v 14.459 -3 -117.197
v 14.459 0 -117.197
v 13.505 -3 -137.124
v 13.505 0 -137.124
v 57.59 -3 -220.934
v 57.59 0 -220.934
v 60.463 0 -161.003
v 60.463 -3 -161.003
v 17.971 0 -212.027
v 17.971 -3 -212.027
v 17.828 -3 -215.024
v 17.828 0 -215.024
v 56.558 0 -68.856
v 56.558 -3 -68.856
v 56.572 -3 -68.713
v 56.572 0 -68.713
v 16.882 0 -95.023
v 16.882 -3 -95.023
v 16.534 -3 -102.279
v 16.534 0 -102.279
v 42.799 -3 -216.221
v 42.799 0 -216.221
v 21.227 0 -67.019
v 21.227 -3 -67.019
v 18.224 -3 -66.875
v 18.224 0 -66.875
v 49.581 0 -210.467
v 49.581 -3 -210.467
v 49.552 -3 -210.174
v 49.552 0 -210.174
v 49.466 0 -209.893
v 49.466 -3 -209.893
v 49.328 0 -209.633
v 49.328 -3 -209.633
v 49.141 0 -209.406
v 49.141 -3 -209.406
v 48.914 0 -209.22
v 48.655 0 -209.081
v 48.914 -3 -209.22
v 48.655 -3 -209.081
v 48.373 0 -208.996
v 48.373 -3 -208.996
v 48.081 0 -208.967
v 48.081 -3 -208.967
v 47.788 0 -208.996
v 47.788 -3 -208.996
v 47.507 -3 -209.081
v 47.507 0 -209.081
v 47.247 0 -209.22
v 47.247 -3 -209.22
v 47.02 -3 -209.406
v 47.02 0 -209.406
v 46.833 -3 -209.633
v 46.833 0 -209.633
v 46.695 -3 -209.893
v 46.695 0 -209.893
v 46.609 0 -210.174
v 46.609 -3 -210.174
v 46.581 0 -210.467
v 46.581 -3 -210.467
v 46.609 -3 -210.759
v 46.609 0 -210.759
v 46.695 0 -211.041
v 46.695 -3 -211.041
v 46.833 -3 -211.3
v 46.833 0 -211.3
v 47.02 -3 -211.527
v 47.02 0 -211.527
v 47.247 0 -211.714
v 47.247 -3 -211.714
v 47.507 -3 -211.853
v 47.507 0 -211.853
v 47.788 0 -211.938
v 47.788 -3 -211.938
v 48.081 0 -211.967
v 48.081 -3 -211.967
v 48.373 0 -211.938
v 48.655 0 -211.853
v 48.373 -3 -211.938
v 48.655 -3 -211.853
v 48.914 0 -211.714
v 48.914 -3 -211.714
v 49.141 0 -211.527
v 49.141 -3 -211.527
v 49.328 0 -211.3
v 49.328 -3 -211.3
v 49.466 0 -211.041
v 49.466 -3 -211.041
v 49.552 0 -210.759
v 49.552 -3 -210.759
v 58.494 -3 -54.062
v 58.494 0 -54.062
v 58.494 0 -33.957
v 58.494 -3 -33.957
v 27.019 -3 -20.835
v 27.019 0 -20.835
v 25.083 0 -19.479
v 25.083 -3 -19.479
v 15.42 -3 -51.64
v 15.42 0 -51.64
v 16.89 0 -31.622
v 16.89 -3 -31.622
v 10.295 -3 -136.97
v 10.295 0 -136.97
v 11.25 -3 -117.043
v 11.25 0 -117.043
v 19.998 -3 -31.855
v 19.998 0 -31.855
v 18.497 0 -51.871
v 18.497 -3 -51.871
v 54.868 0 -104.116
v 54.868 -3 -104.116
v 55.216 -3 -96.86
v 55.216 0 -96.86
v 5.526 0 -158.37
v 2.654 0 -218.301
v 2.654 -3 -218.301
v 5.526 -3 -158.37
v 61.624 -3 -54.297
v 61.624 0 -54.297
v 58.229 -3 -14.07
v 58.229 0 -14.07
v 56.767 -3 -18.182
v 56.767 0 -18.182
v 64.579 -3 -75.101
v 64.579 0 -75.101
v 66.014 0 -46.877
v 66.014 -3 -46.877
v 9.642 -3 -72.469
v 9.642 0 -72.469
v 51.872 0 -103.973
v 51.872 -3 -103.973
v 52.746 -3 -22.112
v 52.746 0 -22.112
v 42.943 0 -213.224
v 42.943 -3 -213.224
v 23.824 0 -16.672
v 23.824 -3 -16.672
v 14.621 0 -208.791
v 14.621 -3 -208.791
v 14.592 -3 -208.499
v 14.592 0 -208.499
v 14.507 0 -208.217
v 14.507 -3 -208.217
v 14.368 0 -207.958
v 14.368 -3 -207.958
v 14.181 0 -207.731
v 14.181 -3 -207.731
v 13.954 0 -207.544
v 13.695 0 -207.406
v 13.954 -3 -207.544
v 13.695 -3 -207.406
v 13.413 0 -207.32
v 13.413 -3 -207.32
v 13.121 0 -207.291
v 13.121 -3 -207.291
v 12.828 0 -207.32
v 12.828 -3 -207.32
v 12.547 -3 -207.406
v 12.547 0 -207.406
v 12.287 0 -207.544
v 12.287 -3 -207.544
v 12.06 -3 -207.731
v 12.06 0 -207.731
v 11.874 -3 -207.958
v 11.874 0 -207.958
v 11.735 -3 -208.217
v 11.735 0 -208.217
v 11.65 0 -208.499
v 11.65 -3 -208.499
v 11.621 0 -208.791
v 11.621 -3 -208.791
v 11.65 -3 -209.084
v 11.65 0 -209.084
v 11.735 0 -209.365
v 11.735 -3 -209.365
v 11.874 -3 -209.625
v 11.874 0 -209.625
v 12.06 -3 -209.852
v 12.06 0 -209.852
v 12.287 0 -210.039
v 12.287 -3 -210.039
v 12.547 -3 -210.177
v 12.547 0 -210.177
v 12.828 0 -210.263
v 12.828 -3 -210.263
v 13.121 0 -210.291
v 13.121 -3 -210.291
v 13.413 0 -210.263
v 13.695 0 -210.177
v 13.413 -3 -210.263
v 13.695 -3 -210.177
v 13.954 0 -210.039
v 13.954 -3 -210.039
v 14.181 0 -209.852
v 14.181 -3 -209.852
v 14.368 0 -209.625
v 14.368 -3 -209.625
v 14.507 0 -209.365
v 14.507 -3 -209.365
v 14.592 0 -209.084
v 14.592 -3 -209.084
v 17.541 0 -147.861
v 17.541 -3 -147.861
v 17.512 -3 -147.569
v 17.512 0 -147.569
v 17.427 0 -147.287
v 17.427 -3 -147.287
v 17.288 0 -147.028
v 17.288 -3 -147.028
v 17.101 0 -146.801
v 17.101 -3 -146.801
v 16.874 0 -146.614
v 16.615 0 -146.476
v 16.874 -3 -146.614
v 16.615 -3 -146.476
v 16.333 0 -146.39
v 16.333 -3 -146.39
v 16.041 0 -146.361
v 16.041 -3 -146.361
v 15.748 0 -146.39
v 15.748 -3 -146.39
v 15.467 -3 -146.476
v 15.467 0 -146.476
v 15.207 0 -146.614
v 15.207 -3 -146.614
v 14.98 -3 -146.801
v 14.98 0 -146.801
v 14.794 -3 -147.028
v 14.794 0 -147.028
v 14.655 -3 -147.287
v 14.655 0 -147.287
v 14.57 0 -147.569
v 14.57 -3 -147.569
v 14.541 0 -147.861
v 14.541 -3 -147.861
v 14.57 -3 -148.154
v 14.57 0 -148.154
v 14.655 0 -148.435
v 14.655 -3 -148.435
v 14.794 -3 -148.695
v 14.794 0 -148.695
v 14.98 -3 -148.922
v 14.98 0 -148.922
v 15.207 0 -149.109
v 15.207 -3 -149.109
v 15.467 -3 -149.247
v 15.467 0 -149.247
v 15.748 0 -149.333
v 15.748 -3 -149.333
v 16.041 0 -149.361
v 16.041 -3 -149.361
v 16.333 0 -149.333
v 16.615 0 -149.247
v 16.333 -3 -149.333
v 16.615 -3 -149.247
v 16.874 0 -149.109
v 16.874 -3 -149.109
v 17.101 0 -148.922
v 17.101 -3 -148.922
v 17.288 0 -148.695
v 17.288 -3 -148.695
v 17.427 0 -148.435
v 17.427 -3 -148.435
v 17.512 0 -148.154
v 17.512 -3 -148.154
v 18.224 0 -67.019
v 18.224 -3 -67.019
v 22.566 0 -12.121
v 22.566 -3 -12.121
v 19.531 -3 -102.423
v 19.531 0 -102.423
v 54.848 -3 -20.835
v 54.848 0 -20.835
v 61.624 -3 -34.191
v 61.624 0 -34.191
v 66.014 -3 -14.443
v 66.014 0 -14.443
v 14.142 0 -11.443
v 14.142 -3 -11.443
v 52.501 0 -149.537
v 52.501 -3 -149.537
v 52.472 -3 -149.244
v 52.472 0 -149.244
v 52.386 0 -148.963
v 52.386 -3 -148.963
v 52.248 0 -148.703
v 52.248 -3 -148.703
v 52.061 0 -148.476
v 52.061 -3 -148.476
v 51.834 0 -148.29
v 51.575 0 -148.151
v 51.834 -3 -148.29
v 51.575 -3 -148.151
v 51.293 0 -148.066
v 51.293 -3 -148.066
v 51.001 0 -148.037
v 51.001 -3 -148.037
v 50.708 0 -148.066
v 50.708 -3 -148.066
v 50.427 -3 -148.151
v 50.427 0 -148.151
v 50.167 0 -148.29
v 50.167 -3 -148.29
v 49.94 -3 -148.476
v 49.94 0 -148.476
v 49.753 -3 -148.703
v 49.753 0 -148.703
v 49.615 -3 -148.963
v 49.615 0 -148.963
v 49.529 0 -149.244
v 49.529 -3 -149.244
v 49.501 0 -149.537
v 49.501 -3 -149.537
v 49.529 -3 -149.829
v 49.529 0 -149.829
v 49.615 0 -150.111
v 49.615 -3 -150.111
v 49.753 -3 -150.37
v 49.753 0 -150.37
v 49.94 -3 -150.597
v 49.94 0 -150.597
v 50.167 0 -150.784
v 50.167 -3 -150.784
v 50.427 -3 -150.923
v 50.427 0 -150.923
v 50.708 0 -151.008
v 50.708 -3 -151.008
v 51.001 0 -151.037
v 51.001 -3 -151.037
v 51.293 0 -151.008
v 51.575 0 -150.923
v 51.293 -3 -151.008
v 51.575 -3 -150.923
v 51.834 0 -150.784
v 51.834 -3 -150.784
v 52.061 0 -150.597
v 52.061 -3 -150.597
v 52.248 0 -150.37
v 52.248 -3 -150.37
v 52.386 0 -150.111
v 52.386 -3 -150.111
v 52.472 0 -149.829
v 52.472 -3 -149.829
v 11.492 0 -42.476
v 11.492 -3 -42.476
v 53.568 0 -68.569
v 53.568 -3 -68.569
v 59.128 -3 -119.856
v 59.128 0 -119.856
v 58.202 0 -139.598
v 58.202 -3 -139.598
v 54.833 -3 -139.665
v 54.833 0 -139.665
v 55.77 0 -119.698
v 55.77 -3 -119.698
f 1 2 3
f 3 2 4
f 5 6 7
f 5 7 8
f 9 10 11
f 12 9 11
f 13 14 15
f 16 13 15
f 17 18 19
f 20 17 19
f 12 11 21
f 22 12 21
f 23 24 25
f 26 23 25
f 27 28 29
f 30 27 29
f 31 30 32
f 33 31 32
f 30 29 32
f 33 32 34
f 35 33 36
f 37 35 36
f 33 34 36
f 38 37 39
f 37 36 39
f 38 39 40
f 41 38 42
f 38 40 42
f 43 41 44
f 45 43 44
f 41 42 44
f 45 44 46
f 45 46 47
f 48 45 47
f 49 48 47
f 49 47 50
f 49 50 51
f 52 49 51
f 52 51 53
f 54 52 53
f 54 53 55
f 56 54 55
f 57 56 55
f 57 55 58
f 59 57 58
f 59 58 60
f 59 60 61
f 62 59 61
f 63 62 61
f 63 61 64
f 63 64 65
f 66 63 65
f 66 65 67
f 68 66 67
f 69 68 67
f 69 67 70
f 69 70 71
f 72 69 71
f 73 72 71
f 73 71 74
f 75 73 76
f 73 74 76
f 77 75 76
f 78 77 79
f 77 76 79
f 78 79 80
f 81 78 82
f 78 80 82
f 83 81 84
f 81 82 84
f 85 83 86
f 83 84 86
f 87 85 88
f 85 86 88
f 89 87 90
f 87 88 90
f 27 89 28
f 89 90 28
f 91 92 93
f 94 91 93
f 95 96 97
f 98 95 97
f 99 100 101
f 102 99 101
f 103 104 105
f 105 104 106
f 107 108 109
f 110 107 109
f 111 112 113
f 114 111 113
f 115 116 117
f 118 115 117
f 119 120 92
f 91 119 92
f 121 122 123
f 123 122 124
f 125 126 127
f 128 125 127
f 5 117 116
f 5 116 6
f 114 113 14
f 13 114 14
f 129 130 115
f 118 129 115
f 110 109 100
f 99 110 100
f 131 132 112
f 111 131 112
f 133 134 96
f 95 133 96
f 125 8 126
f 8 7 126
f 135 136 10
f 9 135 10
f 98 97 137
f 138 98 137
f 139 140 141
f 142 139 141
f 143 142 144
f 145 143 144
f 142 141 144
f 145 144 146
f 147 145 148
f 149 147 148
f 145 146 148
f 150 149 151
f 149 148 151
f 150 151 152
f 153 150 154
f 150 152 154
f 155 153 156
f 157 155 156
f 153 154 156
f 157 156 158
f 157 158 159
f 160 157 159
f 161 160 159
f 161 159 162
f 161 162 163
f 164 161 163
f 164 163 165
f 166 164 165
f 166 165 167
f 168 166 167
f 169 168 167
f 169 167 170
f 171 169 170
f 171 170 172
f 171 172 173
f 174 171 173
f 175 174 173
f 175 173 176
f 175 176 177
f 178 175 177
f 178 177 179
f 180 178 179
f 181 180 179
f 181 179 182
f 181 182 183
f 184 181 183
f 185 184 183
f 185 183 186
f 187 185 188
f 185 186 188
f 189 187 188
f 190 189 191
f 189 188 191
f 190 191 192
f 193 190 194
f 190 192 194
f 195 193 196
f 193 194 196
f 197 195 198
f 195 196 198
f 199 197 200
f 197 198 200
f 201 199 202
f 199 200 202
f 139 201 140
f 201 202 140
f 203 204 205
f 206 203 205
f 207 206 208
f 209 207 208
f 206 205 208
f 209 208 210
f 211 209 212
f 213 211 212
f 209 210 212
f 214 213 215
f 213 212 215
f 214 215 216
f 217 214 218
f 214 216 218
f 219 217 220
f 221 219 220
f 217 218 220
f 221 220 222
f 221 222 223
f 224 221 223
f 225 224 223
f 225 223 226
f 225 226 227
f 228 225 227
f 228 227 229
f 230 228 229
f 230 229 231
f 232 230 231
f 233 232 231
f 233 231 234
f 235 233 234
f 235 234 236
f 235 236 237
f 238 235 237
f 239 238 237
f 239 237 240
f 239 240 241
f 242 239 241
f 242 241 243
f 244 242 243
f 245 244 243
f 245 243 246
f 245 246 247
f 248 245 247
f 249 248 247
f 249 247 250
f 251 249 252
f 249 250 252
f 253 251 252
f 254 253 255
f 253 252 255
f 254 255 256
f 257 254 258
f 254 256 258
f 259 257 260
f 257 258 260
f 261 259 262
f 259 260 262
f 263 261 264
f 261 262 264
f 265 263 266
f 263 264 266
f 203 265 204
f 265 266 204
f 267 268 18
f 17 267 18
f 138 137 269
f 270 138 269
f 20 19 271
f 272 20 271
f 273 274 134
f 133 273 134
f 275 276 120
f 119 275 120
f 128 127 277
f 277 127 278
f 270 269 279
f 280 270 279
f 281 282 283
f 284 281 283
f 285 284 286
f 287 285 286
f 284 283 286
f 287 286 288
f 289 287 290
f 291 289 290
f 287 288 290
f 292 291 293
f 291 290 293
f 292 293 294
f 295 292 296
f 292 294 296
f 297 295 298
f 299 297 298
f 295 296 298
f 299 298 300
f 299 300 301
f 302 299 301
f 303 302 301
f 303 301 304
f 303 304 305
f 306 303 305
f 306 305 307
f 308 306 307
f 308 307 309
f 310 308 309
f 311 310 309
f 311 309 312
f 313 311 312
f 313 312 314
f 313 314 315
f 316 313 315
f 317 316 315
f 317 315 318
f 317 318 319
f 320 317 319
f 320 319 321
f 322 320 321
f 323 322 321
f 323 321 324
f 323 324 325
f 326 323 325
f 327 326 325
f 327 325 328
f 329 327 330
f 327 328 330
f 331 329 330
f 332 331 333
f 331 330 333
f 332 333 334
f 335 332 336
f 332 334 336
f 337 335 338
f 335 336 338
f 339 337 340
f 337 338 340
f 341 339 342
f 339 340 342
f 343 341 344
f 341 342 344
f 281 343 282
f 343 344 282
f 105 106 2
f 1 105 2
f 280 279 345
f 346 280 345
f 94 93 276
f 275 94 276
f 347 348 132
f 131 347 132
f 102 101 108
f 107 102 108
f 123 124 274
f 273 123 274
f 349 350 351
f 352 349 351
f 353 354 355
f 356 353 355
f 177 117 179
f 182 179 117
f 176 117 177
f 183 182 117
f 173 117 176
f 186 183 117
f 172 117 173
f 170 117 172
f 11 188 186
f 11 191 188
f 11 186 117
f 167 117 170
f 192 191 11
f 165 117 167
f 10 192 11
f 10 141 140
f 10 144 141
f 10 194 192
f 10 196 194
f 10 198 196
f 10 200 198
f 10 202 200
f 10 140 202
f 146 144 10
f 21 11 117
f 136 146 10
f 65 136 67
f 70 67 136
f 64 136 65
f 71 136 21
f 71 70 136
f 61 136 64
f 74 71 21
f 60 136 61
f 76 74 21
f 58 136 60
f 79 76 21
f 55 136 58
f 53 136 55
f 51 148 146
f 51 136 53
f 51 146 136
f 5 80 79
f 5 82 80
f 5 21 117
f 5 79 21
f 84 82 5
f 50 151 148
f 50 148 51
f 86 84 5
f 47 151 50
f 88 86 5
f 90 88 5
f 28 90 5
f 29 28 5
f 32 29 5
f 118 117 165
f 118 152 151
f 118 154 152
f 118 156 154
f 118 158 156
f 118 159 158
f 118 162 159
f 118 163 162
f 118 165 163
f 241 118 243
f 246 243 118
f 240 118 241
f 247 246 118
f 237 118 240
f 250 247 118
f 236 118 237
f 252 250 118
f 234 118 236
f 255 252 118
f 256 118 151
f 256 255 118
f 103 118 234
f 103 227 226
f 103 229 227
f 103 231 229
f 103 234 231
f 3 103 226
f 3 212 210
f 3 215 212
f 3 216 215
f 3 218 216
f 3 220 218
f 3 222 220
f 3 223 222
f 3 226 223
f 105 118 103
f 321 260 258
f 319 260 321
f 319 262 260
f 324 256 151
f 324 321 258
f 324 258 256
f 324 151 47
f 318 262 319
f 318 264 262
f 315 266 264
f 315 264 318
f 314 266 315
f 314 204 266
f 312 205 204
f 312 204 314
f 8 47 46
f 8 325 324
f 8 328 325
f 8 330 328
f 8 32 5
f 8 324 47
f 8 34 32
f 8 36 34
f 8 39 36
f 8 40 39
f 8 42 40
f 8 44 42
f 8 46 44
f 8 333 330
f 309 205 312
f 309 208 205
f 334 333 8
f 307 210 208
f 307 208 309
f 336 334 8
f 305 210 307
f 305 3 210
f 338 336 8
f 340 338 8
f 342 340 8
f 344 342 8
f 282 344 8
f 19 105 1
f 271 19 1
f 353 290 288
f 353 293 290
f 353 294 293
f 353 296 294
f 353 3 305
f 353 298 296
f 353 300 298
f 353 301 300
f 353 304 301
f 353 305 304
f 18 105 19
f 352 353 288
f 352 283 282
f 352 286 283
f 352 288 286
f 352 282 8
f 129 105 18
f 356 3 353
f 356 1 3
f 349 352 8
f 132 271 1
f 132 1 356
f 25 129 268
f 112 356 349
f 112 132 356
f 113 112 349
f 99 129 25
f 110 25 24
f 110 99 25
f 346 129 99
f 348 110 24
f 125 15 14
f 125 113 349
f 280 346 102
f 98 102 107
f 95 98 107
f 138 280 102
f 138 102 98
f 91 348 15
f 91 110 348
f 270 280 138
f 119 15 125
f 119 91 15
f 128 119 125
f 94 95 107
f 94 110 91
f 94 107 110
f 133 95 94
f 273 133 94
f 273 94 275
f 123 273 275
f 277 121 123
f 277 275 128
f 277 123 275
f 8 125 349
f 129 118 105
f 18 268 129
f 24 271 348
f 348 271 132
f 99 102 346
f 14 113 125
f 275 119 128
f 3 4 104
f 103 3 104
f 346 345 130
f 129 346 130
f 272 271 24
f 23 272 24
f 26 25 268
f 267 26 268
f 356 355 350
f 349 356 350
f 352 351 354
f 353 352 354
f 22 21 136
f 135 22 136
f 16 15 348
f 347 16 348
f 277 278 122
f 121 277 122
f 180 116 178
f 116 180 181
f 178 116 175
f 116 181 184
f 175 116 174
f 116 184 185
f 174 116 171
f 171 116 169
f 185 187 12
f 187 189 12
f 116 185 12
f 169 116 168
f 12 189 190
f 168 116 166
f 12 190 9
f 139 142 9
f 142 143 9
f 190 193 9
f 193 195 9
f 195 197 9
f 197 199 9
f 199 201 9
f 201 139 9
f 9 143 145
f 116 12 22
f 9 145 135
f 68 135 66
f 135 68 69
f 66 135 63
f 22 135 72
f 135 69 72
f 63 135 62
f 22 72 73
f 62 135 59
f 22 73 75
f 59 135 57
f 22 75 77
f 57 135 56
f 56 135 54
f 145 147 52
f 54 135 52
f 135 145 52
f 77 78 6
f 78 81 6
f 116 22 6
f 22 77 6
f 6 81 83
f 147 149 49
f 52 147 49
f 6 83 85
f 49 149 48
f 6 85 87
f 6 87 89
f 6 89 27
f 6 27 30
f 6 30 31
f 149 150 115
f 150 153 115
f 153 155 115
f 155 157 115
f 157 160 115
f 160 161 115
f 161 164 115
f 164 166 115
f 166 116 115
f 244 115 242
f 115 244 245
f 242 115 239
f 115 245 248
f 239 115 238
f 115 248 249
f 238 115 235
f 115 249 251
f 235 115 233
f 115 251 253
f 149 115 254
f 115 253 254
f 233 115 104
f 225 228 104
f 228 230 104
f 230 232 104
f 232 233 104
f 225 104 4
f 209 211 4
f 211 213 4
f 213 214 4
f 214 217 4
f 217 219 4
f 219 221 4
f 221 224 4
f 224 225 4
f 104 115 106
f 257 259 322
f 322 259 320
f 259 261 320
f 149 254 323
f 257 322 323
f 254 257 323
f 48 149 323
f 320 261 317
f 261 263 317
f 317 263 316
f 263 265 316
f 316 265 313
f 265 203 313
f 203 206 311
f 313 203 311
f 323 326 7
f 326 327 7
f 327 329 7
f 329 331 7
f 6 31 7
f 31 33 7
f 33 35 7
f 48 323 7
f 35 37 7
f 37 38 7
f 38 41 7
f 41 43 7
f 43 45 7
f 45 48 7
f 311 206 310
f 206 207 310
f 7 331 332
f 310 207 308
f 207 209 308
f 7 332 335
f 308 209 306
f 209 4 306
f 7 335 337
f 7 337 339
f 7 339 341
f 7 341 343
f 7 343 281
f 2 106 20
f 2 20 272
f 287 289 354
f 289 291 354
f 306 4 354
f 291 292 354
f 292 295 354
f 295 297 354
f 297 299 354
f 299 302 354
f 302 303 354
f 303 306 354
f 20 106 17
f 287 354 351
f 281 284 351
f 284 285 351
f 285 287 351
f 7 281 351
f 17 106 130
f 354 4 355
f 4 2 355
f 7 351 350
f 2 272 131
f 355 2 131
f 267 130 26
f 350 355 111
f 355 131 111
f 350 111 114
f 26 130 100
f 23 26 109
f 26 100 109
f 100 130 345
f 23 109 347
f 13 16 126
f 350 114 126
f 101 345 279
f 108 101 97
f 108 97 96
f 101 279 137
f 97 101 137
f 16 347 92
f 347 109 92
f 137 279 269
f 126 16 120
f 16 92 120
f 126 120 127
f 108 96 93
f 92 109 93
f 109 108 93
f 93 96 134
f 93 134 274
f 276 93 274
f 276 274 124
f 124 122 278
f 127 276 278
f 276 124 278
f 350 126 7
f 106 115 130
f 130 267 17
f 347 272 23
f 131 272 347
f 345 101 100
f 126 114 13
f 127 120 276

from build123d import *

# Parameters (mm, degrees)
F1_DEPTH = 3
F2_W     = 55
F2_H     = 3
F3_DEPTH = 60
F5_DEPTH = 3.001
F6_R     = 1.5
F7_DEPTH = 25


with BuildPart() as f1:
    # F0 (on Front) → F1 (new body)
    with BuildSketch(Plane.XZ):
        Polygon((9.642301, -72.468617), (5.525627, -158.370032), (60.462578, -161.002788), (64.579252, -75.101374), (66.01405, -46.877436), (66.01405, -14.442657), (58.229018, -14.069573), (56.766827, -18.181978), (54.847706, -20.834833), (52.745808, -22.111611), (27.019382, -20.834833), (25.082963, -19.47934), (23.824289, -16.671533), (22.565616, -12.120947), (14.142194, -11.443201), (11.49178, -42.476468), align=None)
        Polygon((13.504524, -137.123708), (10.295481, -136.96992), (11.250439, -117.043101), (14.459482, -117.196889), align=None, mode=Mode.SUBTRACT)
        Polygon((59.128299, -119.856104), (58.201853, -139.597923), (54.832633, -139.664747), (55.769612, -119.698487), align=None, mode=Mode.SUBTRACT)
        Polygon((18.496964, -51.870942), (15.419618, -51.640142), (16.890456, -31.622363), (19.998123, -31.855437), align=None, mode=Mode.SUBTRACT)
        Polygon((58.493998, -54.062121), (58.493998, -33.956718), (61.623972, -34.191465), (61.623972, -54.296868), align=None, mode=Mode.SUBTRACT)
    extrude(amount=F1_DEPTH)

    # F2 (on face) → F3 (join)
    with BuildSketch(Plane(origin=(-7.559553, 0, -157.742947), x_dir=(0.998854, 0, -0.047868), z_dir=(-0.047868, 0, -0.998854))):
        with Locations((40.600197, 1.5)):
            Rectangle(F2_W, F2_H)
    extrude(amount=F3_DEPTH)

    # F4 (on face) → F5 (cut, through all)
    with BuildSketch(Plane.XZ.offset(3)):
        Polygon((18.223862, -67.019004), (16.881835, -95.022686), (16.534084, -102.279096), (19.530645, -102.4227), (21.227305, -67.019004), (18.223862, -66.875069), align=None)
        Polygon((53.568468, -68.568897), (51.871808, -103.972594), (54.868369, -104.116199), (55.21612, -96.859789), (56.558147, -68.856107), (56.571911, -68.712832), align=None)
    extrude(amount=-F5_DEPTH, mode=Mode.SUBTRACT)

    # F6 (on face) → F7 (cut)
    with BuildSketch(Plane.XZ.offset(3)):
        with Locations((16.040714, -147.861324)):
            Circle(F6_R)
        with Locations((51.000592, -149.536715)):
            Circle(F6_R)
        with Locations((13.120748, -208.791397)):
            Circle(F6_R)
        with Locations((48.080626, -210.466788)):
            Circle(F6_R)
        Polygon((17.827806, -215.023861), (42.799148, -216.220568), (42.942753, -213.224008), (17.971411, -212.0273), align=None)
    extrude(amount=-F7_DEPTH, mode=Mode.SUBTRACT)


solid = f1.part
